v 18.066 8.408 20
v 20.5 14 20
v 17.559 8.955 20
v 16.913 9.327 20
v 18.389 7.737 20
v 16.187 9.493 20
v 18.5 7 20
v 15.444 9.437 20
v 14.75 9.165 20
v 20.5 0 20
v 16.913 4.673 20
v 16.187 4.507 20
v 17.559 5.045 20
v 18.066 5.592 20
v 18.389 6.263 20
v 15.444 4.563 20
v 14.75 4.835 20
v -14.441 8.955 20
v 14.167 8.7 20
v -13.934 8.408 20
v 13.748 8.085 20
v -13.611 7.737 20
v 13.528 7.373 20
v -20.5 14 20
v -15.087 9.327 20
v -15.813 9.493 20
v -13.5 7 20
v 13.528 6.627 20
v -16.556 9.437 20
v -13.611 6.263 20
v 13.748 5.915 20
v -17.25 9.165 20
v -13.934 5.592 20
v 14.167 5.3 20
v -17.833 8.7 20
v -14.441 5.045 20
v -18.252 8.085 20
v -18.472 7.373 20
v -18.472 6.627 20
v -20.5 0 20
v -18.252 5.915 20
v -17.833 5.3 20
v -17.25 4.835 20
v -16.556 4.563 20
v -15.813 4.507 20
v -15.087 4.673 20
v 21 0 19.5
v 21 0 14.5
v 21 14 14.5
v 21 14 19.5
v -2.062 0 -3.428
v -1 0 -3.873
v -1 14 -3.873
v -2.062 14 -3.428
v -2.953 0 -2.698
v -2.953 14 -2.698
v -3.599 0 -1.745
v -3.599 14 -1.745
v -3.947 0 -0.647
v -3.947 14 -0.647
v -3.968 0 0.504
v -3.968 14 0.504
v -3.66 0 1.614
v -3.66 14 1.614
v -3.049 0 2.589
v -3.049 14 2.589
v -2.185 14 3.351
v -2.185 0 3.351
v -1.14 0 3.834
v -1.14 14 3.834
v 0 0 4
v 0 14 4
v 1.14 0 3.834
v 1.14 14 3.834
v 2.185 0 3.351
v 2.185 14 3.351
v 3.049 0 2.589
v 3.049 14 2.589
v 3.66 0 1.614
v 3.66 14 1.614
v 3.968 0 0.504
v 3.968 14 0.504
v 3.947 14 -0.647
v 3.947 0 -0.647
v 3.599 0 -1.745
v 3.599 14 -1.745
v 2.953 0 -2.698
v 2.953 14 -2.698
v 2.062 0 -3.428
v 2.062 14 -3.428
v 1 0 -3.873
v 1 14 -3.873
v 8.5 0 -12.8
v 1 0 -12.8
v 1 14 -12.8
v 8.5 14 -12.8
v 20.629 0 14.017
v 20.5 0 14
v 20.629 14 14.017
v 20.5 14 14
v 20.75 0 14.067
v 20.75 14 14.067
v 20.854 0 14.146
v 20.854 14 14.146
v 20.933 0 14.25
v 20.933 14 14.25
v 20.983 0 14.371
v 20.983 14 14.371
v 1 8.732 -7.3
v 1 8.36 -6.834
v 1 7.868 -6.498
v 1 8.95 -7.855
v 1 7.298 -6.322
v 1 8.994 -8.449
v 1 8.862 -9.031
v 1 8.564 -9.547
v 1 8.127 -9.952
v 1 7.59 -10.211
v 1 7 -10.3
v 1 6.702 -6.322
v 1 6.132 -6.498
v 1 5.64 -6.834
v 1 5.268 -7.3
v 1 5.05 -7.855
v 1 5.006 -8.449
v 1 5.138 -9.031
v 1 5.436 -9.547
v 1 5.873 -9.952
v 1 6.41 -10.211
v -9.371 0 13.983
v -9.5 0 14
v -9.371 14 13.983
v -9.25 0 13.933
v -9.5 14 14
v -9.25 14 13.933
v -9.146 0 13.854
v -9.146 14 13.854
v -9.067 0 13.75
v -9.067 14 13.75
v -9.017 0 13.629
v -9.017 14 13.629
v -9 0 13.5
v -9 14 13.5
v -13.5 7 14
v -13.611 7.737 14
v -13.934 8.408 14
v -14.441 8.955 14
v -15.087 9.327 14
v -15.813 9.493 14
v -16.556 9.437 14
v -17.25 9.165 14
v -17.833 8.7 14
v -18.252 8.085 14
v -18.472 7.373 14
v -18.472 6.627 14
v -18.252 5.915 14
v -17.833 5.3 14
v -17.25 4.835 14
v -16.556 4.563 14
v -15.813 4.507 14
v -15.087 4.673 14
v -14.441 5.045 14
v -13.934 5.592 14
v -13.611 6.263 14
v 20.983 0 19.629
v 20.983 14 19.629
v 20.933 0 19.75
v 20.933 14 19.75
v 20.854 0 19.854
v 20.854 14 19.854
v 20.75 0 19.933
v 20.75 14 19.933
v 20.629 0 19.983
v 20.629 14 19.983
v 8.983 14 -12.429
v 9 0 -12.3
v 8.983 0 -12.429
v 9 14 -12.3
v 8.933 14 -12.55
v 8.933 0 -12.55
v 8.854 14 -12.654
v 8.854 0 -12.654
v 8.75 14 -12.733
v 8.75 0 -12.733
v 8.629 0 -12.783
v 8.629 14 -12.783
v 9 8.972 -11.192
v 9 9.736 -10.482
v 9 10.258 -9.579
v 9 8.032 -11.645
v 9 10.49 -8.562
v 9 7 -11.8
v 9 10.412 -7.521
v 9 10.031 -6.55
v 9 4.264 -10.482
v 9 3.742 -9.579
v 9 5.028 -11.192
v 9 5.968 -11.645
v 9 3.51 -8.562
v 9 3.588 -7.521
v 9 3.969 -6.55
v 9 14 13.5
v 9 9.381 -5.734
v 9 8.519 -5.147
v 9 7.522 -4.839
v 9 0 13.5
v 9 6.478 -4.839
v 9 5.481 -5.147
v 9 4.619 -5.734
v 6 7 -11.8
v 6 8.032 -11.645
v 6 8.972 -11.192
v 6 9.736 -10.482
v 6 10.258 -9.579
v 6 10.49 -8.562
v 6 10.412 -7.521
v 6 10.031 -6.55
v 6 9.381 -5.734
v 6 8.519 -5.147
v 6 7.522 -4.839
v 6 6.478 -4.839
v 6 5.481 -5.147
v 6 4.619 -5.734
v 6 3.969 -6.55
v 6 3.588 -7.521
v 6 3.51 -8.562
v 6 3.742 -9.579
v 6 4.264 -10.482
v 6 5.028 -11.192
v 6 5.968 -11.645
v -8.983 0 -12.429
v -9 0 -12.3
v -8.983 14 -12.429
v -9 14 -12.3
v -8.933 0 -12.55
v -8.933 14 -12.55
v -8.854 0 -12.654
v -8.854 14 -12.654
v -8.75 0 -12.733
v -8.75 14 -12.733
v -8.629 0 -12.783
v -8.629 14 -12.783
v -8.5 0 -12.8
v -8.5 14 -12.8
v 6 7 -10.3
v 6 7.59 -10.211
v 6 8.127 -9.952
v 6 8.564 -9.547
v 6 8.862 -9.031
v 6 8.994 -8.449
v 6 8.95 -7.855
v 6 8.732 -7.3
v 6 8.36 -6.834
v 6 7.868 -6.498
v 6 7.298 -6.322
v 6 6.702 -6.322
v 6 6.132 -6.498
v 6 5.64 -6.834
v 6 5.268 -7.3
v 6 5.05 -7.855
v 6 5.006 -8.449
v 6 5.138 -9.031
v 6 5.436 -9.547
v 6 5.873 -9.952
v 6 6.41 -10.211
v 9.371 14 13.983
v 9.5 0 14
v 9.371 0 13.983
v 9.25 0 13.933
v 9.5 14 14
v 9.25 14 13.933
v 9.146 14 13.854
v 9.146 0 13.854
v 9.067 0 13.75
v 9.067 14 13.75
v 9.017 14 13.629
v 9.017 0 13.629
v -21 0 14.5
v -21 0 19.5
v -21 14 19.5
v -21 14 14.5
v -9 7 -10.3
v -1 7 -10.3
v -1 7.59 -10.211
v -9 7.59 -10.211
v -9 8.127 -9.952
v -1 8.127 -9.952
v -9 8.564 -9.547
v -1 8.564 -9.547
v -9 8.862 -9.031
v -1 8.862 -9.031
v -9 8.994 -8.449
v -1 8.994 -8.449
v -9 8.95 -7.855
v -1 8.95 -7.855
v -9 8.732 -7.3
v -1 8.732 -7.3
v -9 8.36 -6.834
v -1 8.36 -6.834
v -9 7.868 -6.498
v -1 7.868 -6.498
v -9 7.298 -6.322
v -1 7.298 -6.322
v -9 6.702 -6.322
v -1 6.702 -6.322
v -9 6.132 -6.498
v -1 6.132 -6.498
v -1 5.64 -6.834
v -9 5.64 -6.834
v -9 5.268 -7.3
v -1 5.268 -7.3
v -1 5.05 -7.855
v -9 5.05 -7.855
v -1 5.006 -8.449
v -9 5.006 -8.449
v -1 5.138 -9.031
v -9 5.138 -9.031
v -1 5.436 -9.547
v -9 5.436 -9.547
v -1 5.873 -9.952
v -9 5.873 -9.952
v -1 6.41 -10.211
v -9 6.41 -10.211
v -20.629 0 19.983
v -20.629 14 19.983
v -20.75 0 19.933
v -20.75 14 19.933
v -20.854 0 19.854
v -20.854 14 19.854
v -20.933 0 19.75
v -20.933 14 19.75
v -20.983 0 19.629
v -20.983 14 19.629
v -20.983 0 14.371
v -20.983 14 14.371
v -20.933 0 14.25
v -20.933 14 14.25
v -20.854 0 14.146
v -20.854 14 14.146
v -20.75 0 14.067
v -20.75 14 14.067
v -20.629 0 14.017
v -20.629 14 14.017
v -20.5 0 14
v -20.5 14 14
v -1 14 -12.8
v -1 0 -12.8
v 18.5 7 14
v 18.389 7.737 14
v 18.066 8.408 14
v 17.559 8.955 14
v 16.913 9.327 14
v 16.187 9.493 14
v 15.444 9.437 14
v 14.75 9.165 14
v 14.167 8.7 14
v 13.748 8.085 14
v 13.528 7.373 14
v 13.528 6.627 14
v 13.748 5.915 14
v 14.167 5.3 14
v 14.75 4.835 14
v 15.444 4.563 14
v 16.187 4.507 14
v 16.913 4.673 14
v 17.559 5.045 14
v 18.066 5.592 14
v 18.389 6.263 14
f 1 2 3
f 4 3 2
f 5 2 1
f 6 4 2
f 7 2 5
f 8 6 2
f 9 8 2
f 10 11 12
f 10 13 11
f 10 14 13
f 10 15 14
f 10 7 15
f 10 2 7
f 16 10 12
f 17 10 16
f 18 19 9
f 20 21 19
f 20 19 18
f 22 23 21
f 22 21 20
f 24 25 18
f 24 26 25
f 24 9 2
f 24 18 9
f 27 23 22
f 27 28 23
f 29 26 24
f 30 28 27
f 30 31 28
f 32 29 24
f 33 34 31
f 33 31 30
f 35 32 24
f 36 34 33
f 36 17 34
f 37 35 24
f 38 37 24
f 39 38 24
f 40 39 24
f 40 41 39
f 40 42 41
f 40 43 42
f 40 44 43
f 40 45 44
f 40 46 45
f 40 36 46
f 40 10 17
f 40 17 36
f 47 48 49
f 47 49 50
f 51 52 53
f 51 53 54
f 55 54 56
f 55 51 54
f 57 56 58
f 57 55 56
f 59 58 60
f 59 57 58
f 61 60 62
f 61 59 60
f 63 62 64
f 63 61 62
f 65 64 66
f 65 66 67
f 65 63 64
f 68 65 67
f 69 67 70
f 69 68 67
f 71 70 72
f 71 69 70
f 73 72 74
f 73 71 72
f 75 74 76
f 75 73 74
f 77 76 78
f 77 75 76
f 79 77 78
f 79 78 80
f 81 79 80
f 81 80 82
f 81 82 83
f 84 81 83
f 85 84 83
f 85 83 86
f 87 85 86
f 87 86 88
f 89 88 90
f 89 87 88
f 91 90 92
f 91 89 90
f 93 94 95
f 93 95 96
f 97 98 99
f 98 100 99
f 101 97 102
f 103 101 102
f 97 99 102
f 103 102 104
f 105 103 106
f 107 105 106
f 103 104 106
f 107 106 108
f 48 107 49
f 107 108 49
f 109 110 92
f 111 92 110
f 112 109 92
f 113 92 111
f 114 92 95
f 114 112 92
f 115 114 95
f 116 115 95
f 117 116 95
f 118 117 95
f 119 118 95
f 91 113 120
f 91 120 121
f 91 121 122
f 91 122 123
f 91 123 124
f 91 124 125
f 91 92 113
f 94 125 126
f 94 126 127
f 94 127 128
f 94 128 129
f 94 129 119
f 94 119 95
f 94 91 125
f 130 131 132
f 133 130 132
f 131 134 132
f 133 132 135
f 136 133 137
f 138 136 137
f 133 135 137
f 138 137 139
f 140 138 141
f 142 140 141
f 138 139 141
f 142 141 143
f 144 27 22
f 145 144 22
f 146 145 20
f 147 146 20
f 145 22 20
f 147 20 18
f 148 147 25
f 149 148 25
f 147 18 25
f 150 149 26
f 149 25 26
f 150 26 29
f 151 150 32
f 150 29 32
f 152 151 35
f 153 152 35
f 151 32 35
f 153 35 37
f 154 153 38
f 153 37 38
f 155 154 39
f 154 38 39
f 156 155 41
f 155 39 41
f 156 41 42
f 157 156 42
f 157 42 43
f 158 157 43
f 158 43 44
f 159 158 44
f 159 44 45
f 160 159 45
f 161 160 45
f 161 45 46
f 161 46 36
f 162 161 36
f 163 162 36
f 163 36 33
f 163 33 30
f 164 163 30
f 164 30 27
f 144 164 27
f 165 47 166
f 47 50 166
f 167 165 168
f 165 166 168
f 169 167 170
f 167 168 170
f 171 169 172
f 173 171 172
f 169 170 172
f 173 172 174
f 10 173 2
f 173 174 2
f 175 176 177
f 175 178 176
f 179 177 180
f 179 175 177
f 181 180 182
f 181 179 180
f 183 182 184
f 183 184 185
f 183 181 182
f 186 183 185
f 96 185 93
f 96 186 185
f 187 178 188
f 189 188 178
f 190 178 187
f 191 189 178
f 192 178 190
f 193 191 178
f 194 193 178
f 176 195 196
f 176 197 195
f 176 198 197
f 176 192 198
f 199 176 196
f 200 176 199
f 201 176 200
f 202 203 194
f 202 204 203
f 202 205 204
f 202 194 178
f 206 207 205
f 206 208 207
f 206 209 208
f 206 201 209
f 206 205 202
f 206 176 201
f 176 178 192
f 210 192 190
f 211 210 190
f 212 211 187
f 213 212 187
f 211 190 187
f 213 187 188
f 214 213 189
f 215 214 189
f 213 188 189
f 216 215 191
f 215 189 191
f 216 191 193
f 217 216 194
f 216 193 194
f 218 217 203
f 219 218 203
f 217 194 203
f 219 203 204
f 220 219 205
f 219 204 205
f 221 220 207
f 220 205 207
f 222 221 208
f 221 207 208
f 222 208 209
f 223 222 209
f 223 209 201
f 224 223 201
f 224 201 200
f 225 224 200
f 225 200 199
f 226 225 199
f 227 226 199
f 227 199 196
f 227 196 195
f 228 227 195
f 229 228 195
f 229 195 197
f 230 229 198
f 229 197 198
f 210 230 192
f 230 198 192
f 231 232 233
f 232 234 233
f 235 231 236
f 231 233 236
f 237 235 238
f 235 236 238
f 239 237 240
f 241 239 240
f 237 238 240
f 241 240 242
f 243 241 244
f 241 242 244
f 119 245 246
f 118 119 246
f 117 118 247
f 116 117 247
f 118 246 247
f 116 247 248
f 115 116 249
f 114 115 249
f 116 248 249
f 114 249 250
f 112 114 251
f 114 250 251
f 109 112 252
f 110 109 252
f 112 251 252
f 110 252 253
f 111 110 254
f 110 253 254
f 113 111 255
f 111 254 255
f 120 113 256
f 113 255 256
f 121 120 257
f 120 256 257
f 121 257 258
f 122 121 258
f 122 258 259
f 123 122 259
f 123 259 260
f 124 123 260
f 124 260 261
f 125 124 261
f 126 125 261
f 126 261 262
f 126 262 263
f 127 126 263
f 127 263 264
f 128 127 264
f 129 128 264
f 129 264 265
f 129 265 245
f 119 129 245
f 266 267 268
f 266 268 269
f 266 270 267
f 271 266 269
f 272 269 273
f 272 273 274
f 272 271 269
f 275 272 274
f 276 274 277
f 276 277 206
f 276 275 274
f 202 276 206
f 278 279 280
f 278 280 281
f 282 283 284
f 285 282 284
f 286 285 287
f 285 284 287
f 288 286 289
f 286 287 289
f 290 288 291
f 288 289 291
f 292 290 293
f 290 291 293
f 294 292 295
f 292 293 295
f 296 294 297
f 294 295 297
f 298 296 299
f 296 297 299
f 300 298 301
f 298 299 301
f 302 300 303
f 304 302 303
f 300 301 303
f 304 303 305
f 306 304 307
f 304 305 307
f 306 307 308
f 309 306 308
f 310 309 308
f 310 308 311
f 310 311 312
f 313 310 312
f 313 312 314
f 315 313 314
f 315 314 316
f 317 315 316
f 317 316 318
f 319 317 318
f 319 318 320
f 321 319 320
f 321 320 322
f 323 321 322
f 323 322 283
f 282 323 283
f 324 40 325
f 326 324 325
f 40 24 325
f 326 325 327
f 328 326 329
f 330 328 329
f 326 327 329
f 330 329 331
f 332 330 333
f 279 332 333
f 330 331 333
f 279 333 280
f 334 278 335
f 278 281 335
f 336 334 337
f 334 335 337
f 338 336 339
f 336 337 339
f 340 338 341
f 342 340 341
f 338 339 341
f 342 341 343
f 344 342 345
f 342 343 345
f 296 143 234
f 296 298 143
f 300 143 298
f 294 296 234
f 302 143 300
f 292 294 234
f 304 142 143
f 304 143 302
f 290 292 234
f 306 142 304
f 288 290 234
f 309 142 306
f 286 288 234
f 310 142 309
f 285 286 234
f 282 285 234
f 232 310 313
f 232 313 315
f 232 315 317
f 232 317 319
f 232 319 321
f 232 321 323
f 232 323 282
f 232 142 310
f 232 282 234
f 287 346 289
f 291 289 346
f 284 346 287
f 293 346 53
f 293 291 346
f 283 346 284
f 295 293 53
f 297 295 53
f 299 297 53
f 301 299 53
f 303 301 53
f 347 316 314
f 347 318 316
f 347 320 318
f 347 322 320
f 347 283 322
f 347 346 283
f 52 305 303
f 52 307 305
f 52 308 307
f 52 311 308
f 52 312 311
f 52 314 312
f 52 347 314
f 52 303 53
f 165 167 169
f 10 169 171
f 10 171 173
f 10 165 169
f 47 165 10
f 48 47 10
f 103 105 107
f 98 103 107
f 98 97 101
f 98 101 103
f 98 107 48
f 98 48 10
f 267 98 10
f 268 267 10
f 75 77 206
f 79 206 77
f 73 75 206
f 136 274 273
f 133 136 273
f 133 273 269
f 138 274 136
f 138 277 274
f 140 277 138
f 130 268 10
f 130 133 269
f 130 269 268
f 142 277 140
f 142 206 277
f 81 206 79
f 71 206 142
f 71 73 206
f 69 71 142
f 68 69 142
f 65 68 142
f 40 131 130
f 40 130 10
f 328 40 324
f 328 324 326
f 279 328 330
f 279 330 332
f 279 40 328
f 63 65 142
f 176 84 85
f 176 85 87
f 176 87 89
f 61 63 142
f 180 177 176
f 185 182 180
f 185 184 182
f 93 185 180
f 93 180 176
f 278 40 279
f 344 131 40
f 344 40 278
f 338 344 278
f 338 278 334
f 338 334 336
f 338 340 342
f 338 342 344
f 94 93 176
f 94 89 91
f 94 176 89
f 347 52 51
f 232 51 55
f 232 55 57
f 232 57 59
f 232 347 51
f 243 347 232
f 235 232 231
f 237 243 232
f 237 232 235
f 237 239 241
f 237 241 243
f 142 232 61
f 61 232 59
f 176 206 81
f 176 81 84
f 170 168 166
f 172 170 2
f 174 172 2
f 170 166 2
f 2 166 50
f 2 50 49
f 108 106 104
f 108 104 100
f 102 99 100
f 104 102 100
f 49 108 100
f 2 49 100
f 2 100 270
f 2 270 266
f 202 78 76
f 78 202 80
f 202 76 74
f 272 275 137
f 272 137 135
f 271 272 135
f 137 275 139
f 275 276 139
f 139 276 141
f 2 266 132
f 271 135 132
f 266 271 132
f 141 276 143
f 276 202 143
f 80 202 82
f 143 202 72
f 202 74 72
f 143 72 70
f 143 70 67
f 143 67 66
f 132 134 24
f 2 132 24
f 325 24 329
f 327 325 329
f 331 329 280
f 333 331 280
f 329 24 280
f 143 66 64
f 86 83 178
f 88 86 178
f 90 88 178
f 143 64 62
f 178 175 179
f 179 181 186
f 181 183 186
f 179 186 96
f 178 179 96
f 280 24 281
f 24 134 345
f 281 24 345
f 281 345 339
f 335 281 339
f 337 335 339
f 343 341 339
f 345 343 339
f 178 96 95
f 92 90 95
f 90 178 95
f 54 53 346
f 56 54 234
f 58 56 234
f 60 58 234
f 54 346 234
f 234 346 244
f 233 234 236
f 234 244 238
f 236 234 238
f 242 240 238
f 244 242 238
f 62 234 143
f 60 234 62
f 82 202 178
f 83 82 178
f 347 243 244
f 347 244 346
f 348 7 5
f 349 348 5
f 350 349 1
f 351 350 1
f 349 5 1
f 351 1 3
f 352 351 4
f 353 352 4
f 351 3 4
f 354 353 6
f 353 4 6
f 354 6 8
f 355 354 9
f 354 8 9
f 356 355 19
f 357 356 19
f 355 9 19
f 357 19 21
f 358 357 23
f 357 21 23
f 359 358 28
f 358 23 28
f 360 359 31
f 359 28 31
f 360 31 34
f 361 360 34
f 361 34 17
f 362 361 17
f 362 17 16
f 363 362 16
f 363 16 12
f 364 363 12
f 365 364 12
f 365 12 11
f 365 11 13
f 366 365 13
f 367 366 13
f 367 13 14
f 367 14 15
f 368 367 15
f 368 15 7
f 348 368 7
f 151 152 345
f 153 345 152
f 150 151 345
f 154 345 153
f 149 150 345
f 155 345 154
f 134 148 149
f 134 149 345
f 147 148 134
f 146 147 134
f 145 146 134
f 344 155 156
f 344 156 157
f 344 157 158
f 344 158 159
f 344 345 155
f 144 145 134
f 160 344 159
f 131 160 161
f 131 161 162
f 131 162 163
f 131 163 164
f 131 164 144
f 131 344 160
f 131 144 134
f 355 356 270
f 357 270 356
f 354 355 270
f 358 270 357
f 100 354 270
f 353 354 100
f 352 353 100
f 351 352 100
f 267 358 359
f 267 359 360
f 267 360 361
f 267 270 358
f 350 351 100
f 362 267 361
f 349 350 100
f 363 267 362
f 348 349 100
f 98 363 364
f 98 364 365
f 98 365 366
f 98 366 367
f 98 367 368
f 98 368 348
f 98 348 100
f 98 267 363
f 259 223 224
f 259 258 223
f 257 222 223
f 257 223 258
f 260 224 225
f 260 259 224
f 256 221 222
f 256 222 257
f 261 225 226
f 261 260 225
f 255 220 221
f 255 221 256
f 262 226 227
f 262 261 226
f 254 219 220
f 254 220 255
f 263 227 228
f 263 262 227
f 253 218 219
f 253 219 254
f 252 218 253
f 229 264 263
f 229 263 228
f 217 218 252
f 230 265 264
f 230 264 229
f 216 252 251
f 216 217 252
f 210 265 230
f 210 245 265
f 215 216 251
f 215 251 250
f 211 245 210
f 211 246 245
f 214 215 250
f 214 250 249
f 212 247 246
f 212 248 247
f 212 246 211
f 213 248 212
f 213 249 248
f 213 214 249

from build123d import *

# Parameters (mm, degrees)
BOSS_EXTRUDE1_DEPTH = 14
SKETCH2_R           = 2
CUT_EXTRUDE1_DEPTH  = 20
SKETCH3_R           = 3.5
CUT_EXTRUDE2_DEPTH  = 3
SKETCH4_R           = 2.5
CUT_EXTRUDE3_DEPTH  = 8
FILLET1_R           = 0.5


with BuildPart() as part:
    # Sketch1 → Boss-Extrude1 (new body)
    with BuildSketch(Plane(origin=(0, 0, 0), x_dir=(1, 0, 0), z_dir=(0, 1, 0))):
        with BuildLine():
            Line((9, -14), (21, -14))
            Line((21, -14), (21, -20))
            Line((21, -20), (-21, -20))
            Line((-21, -20), (-21, -14))
            Line((-21, -14), (-9, -14))
            Line((-9, -14), (-9, 12.8))
            Line((-9, 12.8), (-1, 12.8))
            Line((-1, 12.8), (-1, 3.872983346))
            ThreePointArc((-1, 3.872983346), (0, -4), (1, 3.872983346))
            Line((1, 3.872983346), (1, 12.8))
            Line((1, 12.8), (9, 12.8))
            Line((9, 12.8), (9, -14))
        make_face()
    extrude(amount=BOSS_EXTRUDE1_DEPTH)

    # Sketch2 → Cut-Extrude1 (cut)
    with BuildSketch(Plane(origin=(9, 0, 0), x_dir=(0, 0, -1), z_dir=(1, 0, 0))):
        with Locations((8.3, 7)):
            Circle(SKETCH2_R)
    extrude(amount=-CUT_EXTRUDE1_DEPTH, mode=Mode.SUBTRACT)

    # Sketch3 → Cut-Extrude2 (cut)
    with BuildSketch(Plane(origin=(9, 0, 0), x_dir=(0, 0, -1), z_dir=(1, 0, 0))):
        with Locations((8.3, 7)):
            Circle(SKETCH3_R)
    extrude(amount=-CUT_EXTRUDE2_DEPTH, mode=Mode.SUBTRACT)

    # Sketch4 → Cut-Extrude3 (cut)
    with BuildSketch(Plane.XY.offset(20)):
        with Locations((-16, 7)):
            Circle(SKETCH4_R)
        with Locations((16, 7)):
            Circle(SKETCH4_R)
    extrude(amount=-CUT_EXTRUDE3_DEPTH, mode=Mode.SUBTRACT)

    # Fillet1
    fillet1_edges = [part.edges().sort_by_distance(p)[0] for p in [
        (-21, 7, 14),
        (-9, 7, 14),
        (-9, 7, -12.8),
        (9, 7, -12.8),
        (9, 7, 14),
        (21, 7, 14),
        (21, 7, 20),
        (-21, 7, 20),
    ]]
    fillet(fillet1_edges, radius=FILLET1_R)


solid = part.part
